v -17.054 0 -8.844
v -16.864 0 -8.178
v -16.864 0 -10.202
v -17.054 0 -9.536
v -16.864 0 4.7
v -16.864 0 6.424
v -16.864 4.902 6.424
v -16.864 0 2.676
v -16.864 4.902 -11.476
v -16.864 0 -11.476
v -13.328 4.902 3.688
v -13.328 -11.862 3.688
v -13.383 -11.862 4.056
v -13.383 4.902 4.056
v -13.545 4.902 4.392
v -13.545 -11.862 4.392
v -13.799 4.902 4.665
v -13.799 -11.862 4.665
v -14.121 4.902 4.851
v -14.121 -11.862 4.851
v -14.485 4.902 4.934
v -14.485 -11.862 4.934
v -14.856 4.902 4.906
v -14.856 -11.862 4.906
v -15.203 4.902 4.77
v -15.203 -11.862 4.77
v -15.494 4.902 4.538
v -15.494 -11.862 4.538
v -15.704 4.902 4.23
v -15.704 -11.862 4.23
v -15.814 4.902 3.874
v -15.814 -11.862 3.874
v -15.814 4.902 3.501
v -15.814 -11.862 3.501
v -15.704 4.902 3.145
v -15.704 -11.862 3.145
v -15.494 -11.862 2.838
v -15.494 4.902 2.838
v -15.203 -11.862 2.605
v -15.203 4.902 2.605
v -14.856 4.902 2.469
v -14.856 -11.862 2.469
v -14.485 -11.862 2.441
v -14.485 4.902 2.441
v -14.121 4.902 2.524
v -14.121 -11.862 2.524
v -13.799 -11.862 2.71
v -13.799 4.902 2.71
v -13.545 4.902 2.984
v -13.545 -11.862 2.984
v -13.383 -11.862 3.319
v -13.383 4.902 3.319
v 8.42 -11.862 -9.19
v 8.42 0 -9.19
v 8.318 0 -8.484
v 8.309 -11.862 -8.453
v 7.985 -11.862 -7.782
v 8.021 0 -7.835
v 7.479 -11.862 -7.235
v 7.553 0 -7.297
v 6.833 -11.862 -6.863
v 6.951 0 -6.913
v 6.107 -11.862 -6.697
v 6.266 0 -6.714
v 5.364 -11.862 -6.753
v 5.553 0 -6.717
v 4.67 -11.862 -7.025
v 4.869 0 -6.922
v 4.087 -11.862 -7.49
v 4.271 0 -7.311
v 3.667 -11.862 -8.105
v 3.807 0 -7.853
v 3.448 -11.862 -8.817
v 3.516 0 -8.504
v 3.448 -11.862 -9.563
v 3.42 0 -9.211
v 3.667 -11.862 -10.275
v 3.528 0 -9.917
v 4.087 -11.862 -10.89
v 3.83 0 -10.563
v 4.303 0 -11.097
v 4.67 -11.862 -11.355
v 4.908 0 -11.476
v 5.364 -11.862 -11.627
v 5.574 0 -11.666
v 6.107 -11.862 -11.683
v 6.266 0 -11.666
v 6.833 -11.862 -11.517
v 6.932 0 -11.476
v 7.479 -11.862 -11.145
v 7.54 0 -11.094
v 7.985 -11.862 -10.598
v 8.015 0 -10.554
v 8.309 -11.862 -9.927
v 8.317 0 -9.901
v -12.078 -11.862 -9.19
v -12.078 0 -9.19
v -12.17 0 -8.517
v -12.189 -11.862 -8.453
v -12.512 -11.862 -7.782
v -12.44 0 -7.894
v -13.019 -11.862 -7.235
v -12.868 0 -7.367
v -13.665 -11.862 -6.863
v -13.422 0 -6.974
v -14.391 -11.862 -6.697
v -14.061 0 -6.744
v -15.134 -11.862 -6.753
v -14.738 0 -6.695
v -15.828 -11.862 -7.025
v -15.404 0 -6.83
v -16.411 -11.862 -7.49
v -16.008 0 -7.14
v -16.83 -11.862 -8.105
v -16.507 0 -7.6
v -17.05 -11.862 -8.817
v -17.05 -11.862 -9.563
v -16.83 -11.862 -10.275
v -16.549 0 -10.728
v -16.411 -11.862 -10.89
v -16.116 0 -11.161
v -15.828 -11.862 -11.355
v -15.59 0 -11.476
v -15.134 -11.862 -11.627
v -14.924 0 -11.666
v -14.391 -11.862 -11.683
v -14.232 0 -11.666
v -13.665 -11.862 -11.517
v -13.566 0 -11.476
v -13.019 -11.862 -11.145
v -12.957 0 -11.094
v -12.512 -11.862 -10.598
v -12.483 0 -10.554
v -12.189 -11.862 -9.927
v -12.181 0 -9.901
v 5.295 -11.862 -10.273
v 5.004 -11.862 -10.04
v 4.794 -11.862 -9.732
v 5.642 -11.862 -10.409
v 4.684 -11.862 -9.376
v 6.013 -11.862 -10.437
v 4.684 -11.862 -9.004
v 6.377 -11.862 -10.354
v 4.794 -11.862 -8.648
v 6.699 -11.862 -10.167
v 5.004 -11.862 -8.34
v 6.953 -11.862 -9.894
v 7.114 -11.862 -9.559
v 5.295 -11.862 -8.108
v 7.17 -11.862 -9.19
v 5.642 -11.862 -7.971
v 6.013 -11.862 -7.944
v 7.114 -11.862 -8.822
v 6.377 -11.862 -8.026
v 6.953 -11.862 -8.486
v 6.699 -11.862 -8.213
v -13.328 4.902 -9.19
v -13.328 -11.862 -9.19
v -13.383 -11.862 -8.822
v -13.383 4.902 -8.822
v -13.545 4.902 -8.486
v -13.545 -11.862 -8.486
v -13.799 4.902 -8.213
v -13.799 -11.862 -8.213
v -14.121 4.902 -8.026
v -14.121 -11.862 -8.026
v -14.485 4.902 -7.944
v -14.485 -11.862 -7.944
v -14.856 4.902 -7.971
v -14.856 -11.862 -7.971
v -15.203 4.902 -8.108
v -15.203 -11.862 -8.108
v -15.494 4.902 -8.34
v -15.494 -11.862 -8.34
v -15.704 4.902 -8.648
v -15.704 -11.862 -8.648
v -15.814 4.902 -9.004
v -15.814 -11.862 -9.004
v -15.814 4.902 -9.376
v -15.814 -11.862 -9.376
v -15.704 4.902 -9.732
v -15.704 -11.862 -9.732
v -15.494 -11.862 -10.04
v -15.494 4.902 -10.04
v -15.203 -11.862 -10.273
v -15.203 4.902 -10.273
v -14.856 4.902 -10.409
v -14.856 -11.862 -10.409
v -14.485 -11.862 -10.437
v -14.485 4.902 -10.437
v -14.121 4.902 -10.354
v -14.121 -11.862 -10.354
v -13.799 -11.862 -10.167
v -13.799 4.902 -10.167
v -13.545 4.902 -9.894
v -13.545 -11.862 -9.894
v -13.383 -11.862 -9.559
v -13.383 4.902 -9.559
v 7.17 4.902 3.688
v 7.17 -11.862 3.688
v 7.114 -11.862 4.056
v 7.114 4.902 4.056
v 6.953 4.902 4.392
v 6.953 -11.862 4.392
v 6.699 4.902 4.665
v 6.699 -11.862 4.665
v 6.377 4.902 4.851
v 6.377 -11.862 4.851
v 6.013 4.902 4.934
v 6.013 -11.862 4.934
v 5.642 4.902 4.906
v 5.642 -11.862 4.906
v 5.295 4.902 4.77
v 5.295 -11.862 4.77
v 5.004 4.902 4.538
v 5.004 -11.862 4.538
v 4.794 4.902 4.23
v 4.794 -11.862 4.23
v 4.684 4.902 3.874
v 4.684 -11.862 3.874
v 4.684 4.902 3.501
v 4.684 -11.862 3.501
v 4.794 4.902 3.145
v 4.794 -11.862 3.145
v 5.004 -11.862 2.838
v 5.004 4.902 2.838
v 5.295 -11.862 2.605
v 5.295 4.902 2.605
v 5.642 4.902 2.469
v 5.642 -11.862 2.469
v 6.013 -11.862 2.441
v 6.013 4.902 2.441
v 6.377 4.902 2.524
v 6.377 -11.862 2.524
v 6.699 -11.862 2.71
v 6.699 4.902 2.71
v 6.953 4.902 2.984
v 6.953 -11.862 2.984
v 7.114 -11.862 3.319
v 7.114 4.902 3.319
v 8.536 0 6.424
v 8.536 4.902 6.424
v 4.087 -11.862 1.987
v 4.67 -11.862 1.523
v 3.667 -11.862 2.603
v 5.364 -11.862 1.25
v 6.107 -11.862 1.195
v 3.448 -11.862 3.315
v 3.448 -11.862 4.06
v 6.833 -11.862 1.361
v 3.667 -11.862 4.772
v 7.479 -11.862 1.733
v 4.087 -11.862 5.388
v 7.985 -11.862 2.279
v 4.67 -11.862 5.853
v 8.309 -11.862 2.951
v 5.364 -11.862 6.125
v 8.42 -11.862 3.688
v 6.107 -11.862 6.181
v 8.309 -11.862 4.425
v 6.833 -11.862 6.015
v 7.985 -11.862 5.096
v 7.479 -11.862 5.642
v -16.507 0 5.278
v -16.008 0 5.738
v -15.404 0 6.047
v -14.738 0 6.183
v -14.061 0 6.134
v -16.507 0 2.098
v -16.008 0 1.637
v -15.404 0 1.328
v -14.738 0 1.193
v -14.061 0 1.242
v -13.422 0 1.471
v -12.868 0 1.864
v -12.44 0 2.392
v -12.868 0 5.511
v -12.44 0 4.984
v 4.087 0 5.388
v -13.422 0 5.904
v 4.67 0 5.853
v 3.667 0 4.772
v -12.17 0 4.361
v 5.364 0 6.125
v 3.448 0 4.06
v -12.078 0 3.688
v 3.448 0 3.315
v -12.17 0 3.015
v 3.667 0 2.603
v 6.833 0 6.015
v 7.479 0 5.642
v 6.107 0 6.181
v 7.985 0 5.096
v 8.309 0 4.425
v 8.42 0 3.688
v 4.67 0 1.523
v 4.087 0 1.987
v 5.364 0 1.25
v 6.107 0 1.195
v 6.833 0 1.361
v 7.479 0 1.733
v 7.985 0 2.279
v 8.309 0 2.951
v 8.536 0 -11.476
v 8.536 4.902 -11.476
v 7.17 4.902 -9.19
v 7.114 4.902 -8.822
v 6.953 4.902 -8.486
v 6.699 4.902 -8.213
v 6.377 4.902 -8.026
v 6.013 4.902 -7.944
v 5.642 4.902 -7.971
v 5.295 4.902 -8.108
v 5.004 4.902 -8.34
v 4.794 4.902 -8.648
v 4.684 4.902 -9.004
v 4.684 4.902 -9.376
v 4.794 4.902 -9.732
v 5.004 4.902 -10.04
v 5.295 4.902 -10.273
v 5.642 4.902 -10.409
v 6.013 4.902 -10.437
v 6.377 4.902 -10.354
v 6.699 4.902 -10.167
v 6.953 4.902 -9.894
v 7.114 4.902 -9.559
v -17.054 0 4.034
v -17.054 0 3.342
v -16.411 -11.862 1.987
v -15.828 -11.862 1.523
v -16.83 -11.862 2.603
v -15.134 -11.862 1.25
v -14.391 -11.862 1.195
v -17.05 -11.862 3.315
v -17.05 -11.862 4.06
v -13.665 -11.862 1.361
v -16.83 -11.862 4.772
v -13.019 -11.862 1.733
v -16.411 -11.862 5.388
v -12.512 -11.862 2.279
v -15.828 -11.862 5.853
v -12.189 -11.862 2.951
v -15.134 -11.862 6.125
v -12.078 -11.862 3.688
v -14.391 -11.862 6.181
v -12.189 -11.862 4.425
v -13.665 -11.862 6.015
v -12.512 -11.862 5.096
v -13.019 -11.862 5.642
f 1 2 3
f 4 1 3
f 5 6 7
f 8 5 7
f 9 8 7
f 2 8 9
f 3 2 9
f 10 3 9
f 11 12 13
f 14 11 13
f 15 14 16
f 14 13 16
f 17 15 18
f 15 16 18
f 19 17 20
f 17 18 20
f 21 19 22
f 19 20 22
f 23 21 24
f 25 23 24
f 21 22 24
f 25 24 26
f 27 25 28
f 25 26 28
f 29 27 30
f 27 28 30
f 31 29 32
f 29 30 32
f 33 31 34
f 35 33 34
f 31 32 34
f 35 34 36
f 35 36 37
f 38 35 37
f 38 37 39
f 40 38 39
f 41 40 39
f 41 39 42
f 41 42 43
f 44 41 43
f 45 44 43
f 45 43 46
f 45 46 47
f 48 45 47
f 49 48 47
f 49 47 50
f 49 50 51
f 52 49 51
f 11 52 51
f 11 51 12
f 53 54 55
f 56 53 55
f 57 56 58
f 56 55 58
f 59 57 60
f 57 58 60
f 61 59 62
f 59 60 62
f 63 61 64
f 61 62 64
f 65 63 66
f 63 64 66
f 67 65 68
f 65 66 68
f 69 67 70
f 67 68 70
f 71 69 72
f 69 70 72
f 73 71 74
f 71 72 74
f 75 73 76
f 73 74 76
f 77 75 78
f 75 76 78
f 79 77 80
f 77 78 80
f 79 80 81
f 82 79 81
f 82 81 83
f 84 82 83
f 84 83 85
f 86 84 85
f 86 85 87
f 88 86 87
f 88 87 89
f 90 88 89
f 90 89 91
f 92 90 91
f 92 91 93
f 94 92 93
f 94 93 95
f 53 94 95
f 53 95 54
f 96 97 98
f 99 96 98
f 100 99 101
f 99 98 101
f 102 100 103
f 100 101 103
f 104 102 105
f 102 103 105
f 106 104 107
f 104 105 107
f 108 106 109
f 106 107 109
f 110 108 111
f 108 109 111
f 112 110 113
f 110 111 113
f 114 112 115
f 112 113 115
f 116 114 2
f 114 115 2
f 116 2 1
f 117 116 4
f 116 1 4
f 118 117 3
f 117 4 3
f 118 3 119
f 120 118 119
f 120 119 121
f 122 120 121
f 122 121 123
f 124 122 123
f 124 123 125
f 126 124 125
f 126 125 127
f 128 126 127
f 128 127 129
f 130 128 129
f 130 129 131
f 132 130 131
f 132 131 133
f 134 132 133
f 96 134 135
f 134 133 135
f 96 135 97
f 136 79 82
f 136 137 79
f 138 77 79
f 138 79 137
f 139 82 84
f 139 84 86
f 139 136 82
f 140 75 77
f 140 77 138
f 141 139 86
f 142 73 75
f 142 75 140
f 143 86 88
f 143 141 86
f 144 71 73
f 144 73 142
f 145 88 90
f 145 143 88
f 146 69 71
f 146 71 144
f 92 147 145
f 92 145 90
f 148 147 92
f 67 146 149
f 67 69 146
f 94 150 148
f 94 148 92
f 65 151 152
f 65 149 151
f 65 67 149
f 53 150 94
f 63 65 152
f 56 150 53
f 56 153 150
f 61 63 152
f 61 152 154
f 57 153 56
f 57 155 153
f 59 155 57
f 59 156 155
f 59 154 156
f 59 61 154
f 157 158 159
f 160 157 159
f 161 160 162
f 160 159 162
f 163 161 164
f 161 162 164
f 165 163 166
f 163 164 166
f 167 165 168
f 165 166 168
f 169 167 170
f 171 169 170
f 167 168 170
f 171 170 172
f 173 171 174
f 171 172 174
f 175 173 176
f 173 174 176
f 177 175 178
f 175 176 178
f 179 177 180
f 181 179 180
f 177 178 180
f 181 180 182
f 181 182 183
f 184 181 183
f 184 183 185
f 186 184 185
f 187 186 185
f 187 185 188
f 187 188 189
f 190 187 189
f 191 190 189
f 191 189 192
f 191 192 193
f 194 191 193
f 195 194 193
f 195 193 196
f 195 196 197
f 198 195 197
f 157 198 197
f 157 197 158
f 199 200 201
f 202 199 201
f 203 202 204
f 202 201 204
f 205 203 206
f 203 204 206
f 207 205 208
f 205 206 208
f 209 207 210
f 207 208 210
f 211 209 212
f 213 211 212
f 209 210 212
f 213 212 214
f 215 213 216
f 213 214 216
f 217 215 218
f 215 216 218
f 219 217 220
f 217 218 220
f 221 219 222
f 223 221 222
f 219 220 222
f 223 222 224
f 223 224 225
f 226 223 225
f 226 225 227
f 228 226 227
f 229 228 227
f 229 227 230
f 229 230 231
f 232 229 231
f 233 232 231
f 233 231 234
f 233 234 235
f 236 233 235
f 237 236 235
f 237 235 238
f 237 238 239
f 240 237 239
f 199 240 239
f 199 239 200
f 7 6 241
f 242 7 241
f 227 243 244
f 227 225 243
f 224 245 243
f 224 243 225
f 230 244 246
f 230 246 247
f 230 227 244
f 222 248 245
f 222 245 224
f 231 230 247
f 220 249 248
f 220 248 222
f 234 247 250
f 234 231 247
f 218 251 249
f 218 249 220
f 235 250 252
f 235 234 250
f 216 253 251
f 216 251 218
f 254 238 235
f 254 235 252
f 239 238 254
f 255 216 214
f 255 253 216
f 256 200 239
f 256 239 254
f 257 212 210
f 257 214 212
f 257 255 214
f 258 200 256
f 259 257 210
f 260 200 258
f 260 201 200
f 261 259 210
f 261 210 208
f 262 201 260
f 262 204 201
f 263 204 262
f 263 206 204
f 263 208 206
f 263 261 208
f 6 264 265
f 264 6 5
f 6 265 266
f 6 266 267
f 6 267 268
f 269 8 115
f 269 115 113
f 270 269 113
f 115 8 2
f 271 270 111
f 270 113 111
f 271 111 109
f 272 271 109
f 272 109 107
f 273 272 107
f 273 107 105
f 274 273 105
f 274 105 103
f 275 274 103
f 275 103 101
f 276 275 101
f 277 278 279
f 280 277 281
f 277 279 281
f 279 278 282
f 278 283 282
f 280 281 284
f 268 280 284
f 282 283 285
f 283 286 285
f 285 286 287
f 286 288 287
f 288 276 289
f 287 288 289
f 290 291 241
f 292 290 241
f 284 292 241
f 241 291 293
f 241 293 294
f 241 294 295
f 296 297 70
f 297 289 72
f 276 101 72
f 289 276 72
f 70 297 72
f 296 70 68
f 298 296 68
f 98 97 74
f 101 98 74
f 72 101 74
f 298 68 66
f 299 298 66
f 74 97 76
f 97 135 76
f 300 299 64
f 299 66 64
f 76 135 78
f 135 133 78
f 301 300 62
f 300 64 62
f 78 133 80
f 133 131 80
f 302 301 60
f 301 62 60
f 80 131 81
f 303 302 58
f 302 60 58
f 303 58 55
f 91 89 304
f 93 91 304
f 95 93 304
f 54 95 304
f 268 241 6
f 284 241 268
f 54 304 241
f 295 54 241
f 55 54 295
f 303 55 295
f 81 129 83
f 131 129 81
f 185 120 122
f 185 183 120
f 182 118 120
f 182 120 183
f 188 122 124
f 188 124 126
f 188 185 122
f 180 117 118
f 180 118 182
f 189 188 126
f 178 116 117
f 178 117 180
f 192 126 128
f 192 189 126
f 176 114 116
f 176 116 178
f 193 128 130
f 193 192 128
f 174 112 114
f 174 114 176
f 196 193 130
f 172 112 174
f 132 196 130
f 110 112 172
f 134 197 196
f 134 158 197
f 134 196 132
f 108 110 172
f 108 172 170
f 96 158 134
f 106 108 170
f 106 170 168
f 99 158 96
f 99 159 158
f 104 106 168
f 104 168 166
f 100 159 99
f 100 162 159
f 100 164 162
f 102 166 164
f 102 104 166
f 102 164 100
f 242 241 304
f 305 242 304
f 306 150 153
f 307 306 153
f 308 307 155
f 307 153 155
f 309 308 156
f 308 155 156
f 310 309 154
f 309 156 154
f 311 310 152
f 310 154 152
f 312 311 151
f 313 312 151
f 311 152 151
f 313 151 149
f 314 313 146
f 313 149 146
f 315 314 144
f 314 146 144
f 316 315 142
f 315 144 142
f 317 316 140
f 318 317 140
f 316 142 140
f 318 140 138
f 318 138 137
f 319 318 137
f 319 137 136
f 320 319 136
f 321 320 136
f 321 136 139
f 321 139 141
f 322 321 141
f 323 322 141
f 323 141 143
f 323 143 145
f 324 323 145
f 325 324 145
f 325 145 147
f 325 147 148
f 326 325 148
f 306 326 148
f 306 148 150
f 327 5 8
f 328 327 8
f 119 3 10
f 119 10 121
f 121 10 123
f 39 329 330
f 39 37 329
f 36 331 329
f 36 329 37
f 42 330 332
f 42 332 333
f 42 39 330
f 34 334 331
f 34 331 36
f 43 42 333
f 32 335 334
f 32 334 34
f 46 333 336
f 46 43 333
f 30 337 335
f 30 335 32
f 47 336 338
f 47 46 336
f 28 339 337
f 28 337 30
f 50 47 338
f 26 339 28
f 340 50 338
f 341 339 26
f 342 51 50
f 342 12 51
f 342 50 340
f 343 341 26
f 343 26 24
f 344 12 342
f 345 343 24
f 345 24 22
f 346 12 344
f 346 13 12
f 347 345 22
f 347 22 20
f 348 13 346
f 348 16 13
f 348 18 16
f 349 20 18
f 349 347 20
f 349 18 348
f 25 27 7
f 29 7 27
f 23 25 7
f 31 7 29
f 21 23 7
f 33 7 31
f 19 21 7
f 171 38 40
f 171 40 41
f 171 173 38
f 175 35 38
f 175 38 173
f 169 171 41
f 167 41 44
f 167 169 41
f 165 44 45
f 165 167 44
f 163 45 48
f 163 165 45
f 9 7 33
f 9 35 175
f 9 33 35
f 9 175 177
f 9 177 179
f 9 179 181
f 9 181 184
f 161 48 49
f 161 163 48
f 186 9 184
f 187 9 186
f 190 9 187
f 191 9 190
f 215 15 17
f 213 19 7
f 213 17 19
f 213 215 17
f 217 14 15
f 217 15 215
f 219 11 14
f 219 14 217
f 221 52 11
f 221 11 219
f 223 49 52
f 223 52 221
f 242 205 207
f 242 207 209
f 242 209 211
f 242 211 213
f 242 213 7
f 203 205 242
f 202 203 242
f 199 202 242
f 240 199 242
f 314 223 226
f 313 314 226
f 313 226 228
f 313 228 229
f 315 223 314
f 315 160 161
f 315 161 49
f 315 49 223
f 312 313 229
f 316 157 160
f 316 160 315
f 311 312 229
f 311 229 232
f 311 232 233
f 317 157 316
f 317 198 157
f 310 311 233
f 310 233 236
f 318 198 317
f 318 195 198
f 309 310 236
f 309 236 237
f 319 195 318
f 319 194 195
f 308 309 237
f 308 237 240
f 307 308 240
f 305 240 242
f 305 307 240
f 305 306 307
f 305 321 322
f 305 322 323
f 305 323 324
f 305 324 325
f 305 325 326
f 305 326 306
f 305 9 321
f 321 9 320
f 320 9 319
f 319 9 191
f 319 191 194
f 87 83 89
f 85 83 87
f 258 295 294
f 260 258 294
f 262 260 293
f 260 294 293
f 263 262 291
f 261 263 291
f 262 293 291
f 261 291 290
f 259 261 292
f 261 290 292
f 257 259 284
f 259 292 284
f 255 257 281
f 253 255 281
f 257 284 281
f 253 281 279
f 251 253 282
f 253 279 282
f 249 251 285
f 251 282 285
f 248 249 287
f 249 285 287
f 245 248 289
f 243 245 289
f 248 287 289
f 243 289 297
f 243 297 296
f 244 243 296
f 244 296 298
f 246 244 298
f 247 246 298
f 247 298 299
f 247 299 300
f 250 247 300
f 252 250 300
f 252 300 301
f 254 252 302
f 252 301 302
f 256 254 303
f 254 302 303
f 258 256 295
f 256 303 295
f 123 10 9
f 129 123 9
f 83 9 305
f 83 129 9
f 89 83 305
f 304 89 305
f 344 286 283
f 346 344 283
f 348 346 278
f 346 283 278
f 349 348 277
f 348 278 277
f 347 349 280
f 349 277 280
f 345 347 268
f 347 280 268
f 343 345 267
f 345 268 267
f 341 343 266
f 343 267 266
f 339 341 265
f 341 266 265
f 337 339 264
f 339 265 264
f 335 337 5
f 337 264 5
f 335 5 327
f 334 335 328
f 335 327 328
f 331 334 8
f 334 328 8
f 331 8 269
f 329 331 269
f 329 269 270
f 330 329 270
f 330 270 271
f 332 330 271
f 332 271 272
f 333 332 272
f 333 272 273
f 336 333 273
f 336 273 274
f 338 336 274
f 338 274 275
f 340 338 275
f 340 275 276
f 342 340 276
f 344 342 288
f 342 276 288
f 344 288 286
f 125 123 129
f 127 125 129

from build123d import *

# Parameters (mm, degrees)
SKETCH1_W           = 25.4
SKETCH1_H           = 17.9
BOSS_EXTRUDE1_DEPTH = 4.9022
SKETCH2_R           = 2.5
BOSS_EXTRUDE2_DEPTH = 11.8618
SKETCH3_R           = 1.25
CUT_EXTRUDE1_DEPTH  = 17.764


with BuildPart() as part:
    # Sketch1 → Boss-Extrude1 (new body)
    with BuildSketch(Plane(origin=(0, 0, 0), x_dir=(1, 0, 0), z_dir=(0, 1, 0))):
        with Locations((-4.163944862, 2.526057393)):
            Rectangle(SKETCH1_W, SKETCH1_H)
    extrude(amount=BOSS_EXTRUDE1_DEPTH)

    # Sketch2 → Boss-Extrude2 (add)
    with BuildSketch(Plane.XZ):
        with Locations((-14.577944862, 3.687742607)):
            Circle(SKETCH2_R)
        with Locations((5.919855138, 3.687742607)):
            Circle(SKETCH2_R)
        with Locations((5.919855138, -9.190057393)):
            Circle(SKETCH2_R)
        with Locations((-14.577944862, -9.190057393)):
            Circle(SKETCH2_R)
    extrude(amount=BOSS_EXTRUDE2_DEPTH)

    # Sketch3 → Cut-Extrude1 (cut, through all)
    with BuildSketch(Plane.XZ.offset(11.8618)):
        with Locations((-14.577944862, 3.687742607)):
            Circle(SKETCH3_R)
        with Locations((-14.577944862, -9.190057393)):
            Circle(SKETCH3_R)
        with Locations((5.919855138, -9.190057393)):
            Circle(SKETCH3_R)
        with Locations((5.919855138, 3.687742607)):
            Circle(SKETCH3_R)
    extrude(amount=-CUT_EXTRUDE1_DEPTH, mode=Mode.SUBTRACT)


solid = part.part
